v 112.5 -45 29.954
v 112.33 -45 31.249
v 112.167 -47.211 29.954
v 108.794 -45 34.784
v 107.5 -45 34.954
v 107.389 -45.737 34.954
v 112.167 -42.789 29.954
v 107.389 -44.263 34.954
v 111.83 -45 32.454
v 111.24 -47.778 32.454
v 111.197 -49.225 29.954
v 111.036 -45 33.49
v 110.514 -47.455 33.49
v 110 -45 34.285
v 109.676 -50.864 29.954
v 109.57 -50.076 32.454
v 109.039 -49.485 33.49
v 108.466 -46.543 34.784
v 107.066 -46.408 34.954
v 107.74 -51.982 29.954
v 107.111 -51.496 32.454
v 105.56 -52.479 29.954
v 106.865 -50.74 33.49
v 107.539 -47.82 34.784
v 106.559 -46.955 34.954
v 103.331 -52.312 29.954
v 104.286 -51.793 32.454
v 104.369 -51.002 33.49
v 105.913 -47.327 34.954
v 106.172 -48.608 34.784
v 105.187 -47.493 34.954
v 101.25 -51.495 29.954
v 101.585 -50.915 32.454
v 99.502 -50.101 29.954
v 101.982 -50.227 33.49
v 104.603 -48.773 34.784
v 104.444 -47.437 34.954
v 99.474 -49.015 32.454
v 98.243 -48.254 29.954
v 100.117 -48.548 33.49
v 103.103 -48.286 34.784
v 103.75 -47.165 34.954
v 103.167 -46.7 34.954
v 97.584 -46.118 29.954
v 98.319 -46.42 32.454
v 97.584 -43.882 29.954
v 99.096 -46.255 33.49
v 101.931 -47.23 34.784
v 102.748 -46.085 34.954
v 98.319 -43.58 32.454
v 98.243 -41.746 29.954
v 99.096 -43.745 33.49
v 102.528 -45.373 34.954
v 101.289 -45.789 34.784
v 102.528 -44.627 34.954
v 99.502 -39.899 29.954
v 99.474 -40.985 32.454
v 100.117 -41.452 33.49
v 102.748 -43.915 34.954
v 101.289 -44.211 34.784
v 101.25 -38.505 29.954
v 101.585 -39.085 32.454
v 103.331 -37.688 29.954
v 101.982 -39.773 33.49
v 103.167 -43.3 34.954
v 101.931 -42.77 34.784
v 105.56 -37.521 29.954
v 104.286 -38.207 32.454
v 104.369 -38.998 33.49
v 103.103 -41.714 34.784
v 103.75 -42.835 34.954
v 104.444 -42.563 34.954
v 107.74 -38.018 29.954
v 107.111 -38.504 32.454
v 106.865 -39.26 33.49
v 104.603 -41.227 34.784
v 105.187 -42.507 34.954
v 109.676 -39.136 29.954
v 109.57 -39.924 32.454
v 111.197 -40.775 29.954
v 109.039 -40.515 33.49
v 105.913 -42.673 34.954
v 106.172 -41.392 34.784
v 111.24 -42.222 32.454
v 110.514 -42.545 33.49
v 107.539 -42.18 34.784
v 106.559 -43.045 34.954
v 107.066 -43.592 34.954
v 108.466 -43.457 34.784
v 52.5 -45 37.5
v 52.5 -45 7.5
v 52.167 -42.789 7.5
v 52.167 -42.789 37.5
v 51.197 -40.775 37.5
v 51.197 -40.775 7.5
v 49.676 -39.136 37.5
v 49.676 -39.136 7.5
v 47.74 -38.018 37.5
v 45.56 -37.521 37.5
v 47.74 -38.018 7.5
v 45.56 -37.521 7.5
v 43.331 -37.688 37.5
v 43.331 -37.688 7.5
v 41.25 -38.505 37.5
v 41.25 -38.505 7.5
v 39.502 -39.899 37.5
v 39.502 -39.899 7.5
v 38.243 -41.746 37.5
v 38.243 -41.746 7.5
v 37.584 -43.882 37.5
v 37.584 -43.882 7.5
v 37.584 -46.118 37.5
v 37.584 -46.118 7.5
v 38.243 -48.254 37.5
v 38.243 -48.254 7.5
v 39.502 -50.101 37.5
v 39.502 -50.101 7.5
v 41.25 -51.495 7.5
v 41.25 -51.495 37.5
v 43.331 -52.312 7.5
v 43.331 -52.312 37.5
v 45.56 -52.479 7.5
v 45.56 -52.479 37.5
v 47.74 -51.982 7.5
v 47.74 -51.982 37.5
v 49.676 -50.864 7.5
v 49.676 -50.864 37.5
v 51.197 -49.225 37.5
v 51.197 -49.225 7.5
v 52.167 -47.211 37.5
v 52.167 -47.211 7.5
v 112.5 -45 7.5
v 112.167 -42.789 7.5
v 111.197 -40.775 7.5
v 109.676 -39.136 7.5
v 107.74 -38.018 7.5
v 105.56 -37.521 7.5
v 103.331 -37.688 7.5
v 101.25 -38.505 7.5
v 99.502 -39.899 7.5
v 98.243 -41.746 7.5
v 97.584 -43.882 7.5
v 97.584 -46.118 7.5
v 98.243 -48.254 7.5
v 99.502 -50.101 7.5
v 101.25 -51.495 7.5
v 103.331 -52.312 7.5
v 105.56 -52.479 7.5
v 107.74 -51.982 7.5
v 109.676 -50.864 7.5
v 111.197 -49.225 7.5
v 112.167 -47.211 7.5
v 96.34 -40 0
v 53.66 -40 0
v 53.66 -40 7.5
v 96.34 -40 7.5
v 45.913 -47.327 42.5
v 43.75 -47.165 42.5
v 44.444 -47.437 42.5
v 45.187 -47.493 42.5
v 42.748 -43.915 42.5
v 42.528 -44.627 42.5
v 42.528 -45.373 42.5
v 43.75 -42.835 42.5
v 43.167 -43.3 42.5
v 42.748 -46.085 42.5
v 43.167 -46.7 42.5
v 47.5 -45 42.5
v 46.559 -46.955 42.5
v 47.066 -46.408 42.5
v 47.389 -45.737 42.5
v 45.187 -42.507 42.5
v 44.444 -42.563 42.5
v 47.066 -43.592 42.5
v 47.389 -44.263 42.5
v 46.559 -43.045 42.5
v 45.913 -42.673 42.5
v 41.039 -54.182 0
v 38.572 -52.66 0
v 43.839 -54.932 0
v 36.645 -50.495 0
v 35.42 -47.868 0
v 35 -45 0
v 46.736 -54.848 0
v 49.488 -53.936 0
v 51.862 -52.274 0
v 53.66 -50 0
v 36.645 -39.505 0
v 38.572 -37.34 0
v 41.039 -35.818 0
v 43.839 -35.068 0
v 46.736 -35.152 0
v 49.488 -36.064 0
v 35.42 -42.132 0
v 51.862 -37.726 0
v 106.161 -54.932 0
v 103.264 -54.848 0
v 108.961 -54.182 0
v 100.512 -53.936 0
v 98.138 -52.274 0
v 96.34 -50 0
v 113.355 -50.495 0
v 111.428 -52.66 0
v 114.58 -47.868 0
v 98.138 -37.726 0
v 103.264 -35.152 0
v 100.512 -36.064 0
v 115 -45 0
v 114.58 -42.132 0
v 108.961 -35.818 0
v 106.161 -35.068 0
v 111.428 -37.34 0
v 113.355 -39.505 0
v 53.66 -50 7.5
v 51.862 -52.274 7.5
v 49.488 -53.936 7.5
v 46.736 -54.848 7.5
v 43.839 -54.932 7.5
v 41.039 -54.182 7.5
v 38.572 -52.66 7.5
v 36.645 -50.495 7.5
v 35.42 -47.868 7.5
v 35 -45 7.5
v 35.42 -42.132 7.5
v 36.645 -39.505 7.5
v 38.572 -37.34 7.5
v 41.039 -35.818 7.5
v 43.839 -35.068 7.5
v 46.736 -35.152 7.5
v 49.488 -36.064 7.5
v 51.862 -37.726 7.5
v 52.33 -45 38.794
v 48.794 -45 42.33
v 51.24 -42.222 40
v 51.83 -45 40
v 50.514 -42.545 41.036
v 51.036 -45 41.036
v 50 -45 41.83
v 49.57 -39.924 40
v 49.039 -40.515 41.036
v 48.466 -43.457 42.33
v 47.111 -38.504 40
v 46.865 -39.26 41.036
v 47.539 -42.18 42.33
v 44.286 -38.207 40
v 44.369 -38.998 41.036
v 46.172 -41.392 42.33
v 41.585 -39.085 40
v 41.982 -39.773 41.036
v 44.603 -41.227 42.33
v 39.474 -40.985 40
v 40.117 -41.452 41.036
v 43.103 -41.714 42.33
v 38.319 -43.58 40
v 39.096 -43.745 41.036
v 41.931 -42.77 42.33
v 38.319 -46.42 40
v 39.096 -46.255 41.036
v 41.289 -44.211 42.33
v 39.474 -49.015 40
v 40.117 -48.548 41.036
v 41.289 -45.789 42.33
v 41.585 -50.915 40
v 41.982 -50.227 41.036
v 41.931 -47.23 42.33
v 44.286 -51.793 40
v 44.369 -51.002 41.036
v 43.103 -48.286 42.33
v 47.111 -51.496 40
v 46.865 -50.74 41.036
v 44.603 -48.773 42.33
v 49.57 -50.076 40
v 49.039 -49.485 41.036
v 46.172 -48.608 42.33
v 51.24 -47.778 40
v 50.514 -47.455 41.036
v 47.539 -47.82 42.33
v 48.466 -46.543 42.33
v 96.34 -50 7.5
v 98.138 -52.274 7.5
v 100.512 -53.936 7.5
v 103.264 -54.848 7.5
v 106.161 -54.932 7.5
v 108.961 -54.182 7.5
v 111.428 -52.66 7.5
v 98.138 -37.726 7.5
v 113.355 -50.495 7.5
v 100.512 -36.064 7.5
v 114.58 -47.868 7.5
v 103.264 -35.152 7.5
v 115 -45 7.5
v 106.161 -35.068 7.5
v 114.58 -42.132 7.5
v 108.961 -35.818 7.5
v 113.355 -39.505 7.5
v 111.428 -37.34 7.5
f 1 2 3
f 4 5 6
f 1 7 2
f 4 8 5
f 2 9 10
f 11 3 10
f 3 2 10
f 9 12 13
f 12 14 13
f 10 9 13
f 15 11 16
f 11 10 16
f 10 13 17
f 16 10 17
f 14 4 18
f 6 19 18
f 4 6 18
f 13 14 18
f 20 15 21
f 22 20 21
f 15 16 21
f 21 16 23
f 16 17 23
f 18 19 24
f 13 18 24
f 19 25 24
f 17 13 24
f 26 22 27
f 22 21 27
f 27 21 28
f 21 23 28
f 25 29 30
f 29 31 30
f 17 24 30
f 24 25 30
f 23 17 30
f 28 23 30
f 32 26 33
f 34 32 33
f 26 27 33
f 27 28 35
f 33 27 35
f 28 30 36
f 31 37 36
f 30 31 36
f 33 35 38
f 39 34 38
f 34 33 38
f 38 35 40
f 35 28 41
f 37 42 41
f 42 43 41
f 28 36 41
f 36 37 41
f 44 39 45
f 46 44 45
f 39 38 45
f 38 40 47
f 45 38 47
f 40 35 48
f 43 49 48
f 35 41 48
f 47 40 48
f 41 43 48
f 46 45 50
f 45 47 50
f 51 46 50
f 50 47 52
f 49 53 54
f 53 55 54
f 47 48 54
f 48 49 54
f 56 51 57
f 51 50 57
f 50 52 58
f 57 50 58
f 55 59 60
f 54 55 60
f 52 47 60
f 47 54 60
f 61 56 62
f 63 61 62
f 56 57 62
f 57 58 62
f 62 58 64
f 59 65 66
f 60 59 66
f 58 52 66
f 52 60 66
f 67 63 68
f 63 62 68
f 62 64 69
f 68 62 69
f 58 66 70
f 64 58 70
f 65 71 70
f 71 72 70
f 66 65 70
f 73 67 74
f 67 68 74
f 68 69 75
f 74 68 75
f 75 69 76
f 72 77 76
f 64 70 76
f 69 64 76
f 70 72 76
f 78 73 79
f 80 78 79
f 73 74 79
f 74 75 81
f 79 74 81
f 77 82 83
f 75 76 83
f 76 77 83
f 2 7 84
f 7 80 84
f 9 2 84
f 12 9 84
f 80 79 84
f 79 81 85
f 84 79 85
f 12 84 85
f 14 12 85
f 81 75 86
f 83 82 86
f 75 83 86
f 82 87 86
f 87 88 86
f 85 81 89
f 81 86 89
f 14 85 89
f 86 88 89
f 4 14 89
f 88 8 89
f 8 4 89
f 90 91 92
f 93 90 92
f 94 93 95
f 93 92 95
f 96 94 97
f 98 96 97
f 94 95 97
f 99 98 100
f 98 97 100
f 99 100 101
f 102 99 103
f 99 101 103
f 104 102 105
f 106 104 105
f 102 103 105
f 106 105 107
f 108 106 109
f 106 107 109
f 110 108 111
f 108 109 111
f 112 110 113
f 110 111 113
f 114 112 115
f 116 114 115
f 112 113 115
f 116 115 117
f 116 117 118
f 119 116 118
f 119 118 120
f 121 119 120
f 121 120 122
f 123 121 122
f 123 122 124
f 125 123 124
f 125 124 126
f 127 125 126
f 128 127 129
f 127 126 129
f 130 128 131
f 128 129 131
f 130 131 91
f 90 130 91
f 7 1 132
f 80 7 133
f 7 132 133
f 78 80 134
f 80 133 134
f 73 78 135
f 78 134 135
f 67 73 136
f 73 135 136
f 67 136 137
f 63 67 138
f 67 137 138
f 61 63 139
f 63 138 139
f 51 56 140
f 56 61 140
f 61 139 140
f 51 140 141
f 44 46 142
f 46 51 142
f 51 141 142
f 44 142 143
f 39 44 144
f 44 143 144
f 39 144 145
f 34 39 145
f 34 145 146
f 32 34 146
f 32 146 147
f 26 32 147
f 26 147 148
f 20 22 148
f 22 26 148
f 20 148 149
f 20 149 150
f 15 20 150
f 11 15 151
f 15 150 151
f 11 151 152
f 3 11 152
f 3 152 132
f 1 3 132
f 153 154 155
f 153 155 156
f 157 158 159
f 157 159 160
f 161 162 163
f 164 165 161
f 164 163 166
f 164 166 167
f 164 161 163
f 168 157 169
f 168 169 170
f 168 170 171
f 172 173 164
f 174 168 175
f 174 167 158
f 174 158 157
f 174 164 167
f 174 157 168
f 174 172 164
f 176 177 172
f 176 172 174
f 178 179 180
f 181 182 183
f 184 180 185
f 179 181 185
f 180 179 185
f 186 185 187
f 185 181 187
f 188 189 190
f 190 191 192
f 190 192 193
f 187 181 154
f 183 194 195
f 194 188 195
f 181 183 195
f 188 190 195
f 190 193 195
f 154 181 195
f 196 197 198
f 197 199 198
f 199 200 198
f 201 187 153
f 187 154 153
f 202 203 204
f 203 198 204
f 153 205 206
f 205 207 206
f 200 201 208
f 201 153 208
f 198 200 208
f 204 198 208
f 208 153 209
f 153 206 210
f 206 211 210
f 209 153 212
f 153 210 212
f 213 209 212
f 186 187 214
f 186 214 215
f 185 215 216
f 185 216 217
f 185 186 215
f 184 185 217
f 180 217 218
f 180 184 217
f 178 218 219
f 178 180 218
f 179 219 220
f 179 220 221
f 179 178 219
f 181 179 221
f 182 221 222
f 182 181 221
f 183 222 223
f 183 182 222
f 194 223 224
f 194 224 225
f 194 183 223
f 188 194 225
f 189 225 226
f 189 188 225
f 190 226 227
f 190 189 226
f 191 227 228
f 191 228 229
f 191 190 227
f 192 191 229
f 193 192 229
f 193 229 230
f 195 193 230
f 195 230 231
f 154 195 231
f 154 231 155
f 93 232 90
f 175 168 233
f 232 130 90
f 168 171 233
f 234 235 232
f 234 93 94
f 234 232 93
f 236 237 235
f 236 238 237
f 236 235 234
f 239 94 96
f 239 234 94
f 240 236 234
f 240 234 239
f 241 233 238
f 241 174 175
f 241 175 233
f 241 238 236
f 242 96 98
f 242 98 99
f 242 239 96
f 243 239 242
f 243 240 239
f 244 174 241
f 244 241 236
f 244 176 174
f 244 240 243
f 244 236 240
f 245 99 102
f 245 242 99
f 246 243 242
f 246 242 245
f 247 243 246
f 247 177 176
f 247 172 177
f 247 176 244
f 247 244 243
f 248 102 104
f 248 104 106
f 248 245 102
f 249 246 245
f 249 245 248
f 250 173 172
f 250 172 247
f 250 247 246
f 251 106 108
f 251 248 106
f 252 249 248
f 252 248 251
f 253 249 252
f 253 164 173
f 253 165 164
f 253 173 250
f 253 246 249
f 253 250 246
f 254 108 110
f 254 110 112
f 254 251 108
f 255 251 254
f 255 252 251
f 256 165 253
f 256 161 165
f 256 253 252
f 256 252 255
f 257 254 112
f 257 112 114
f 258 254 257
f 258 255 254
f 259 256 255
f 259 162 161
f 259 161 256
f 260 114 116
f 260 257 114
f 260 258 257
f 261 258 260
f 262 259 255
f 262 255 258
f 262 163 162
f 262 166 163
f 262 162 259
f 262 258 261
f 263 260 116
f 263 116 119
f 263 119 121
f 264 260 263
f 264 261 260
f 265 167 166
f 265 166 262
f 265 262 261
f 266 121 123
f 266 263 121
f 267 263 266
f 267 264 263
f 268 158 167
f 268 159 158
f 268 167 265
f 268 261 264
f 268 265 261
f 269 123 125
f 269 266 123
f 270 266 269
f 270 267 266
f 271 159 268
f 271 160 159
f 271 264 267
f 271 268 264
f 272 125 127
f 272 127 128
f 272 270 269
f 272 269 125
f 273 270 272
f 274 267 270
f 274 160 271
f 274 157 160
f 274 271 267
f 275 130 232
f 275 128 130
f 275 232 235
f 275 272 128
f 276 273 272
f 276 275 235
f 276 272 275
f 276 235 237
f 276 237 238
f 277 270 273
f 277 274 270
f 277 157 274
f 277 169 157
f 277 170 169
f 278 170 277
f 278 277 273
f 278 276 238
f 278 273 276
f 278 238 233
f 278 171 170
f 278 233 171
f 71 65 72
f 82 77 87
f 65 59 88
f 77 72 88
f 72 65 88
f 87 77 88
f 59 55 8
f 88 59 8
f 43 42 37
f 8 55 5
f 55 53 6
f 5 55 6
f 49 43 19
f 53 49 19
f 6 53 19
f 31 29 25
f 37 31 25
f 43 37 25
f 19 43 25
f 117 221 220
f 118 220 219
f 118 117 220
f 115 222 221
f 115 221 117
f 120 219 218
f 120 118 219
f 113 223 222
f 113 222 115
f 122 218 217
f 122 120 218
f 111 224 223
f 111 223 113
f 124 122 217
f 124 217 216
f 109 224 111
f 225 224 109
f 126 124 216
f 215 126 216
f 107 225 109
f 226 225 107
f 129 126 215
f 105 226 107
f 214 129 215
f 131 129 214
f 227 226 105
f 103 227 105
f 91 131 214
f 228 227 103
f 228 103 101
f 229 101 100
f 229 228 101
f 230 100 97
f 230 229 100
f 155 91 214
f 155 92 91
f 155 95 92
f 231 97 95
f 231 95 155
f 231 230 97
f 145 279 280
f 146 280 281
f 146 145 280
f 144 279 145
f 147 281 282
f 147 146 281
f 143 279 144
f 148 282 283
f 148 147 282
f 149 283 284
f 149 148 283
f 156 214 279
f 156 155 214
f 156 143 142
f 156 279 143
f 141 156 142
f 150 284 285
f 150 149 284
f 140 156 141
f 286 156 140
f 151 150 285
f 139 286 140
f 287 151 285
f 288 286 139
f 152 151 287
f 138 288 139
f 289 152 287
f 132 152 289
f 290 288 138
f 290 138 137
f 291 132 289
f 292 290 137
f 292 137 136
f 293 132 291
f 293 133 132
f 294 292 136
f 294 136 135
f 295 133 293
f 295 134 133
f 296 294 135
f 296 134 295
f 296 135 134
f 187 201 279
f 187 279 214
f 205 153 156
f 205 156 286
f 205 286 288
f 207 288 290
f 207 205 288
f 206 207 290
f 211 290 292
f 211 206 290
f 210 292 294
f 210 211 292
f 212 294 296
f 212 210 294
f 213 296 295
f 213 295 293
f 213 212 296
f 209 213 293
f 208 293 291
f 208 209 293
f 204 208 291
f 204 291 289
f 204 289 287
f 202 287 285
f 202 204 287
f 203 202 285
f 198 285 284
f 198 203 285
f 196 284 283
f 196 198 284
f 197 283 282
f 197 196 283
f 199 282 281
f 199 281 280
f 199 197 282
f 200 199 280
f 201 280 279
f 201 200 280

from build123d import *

# Parameters (mm, degrees)
SKETCH1_W               = 150
SKETCH1_H               = 90
BOSS_EXTRUDE1_DEPTH     = 70
SHELL4_T                = -5
SKETCH2_R               = 20
BOSS_EXTRUDE2_DEPTH     = 2.5
SKETCH3_R               = 7.5
BOSS_EXTRUDE3_DEPTH     = 35
SKETCH4_W               = 65
SKETCH4_H               = 4.658499389
CUT_EXTRUDE1_DEPTH      = 189.414436814
SKETCH6_W               = 3
SKETCH6_H               = 3
CUT_EXTRUDE3_DEPTH      = 40
FILLET4_R               = 5
FILLET5_R               = 5
SKETCH10_W              = 3
SKETCH10_H              = 3
CUT_EXTRUDE4_DEPTH      = 40
CUT_EXTRUDE5_DEPTH      = 187.614576065
CUT_EXTRUDE5_DEPTH_BACK = 187.614576065
SKETCH11_W              = 3
SKETCH11_H              = 3
SKETCH11_R              = 20
SKETCH12_W              = 30
SKETCH12_H              = 10
BOSS_EXTRUDE4_DEPTH     = 7.5
CUT_EXTRUDE8_DEPTH      = 146.17231141
CUT_EXTRUDE8_DEPTH_BACK = 146.17231141


with BuildPart() as part:
    # Sketch1 → Boss-Extrude1 (new body)
    with BuildSketch(Plane.XY):
        with Locations((75, -45)):
            Rectangle(SKETCH1_W, SKETCH1_H)
    extrude(amount=BOSS_EXTRUDE1_DEPTH)

    # Shell4
    shell4_openings = [part.faces().sort_by_distance(p)[0] for p in [
        (75, -45, 70),
    ]]
    offset(amount=SHELL4_T, openings=shell4_openings, kind=Kind.INTERSECTION)

    # Sketch2 → Boss-Extrude2 (add)
    with BuildSketch(Plane.XY.offset(5)):
        with Locations((45, -45)):
            Circle(SKETCH2_R)
        with Locations((105, -45)):
            Circle(SKETCH2_R)
    extrude(amount=BOSS_EXTRUDE2_DEPTH)

    # Sketch3 → Boss-Extrude3 (add)
    with BuildSketch(Plane.XY.offset(7.5)):
        with Locations((45, -45)):
            Circle(SKETCH3_R)
        with Locations((105, -45)):
            Circle(SKETCH3_R)
    extrude(amount=BOSS_EXTRUDE3_DEPTH)

    # Sketch4 → Cut-Extrude1 (cut, through all)
    with BuildSketch(Plane.XZ.offset(90)):
        Polygon((85, 70), (85, 49.954434269), (85, 34.954434269), (150, 34.954434269), (150, 70), align=None)
        with Locations((117.5, 72.329249694)):
            Rectangle(SKETCH4_W, SKETCH4_H)
    extrude(amount=-CUT_EXTRUDE1_DEPTH, mode=Mode.SUBTRACT)

    # Sketch6 → Cut-Extrude3 (cut)
    with BuildSketch(Plane.XY.offset(34.954434269)):
        with Locations((96.5, -2.5)):
            Rectangle(SKETCH6_W, SKETCH6_H)
        with Locations((113.5, -2.5)):
            Rectangle(SKETCH6_W, SKETCH6_H)
        with Locations((96.5, -87.5)):
            Rectangle(SKETCH6_W, SKETCH6_H)
        with Locations((113.5, -87.5)):
            Rectangle(SKETCH6_W, SKETCH6_H)
    extrude(amount=-CUT_EXTRUDE3_DEPTH, mode=Mode.SUBTRACT)

    # Fillet4
    fillet4_edges = [part.edges().sort_by_distance(p)[0] for p in [
        (5, -5, 37.5),
        (5, -85, 37.5),
        (145, -5, 19.977217134),
        (145, -85, 19.977217134),
        (150, 0, 17.477217134),
        (150, -90, 17.477217134),
        (85, -87.5, 70),
        (85, -87.5, 34.954434269),
        (85, -2.5, 70),
        (85, -2.5, 34.954434269),
        (0, 0, 35),
        (0, -90, 35),
    ]]
    fillet(fillet4_edges, radius=FILLET4_R)

    # Fillet5
    fillet5_edges = [part.edges().sort_by_distance(p)[0] for p in [
        (37.5, -45, 42.5),
        (97.5, -45, 34.954434269),
    ]]
    fillet(fillet5_edges, radius=FILLET5_R)

    # Sketch10 → Cut-Extrude4 (cut)
    with BuildSketch(Plane.XY.offset(70)):
        with Locations((2.5, -45)):
            Rectangle(SKETCH10_W, SKETCH10_H)
        with Locations((37.5, -87.5)):
            Rectangle(SKETCH10_W, SKETCH10_H)
        with Locations((37.5, -2.5)):
            Rectangle(SKETCH10_W, SKETCH10_H)
    extrude(amount=-CUT_EXTRUDE4_DEPTH, mode=Mode.SUBTRACT)

    # Sketch11 → Cut-Extrude5 (cut, two sides: drawn at the far end of the back side and taken through both)
    # profile 1 of 4: a face of its own
    with BuildSketch(Plane.XY.offset(5).offset(-CUT_EXTRUDE5_DEPTH_BACK)):
        with BuildLine():
            Line((85, -5), (85, 0))
            Line((85, 0), (80, 0))
            Line((80, 0), (5, 0))
            ThreePointArc((5, 0), (1.464466094, -1.464466094), (0, -5))
            Line((0, -5), (0, -85))
            ThreePointArc((0, -85), (1.464466094, -88.535533906), (5, -90))
            Line((5, -90), (80, -90))
            Line((80, -90), (85, -90))
            Line((85, -90), (85, -85))
            Line((85, -85), (80, -85))
            Line((80, -85), (10, -85))
            ThreePointArc((10, -85), (6.464466094, -83.535533906), (5, -80))
            Line((5, -80), (5, -10))
            ThreePointArc((5, -10), (6.464466094, -6.464466094), (10, -5))
            Line((10, -5), (80, -5))
            Line((80, -5), (85, -5))
        make_face()
        with Locations((37.5, -87.5)):
            Rectangle(SKETCH11_W, SKETCH11_H, mode=Mode.SUBTRACT)
        with Locations((2.5, -45)):
            Rectangle(SKETCH11_W, SKETCH11_H, mode=Mode.SUBTRACT)
        with Locations((37.5, -2.5)):
            Rectangle(SKETCH11_W, SKETCH11_H, mode=Mode.SUBTRACT)
    # profile 2 of 4: a face of its own
    with BuildSketch(Plane.XY.offset(5).offset(-CUT_EXTRUDE5_DEPTH_BACK)):
        with BuildLine():
            ThreePointArc((140, -85), (143.535533906, -83.535533906), (145, -80))
            Line((145, -80), (145, -10))
            ThreePointArc((145, -10), (143.535533906, -6.464466094), (140, -5))
            Line((140, -5), (10, -5))
            ThreePointArc((10, -5), (6.464466094, -6.464466094), (5, -10))
            Line((5, -10), (5, -80))
            ThreePointArc((5, -80), (6.464466094, -83.535533906), (10, -85))
            Line((10, -85), (140, -85))
        make_face()
        with Locations((105, -45)):
            Circle(SKETCH11_R, mode=Mode.SUBTRACT)
        with Locations((45, -45)):
            Circle(SKETCH11_R, mode=Mode.SUBTRACT)
    # profile 3 of 4: a face of its own
    with BuildSketch(Plane.XY.offset(5).offset(-CUT_EXTRUDE5_DEPTH_BACK)):
        with BuildLine():
            Line((145, 0), (90, 0))
            Line((90, 0), (85, 0))
            Line((85, 0), (85, -5))
            Line((85, -5), (90, -5))
            Line((90, -5), (140, -5))
            ThreePointArc((140, -5), (143.535533906, -6.464466094), (145, -10))
            Line((145, -10), (145, -80))
            ThreePointArc((145, -80), (143.535533906, -83.535533906), (140, -85))
            Line((140, -85), (90, -85))
            Line((90, -85), (85, -85))
            Line((85, -85), (85, -90))
            Line((85, -90), (90, -90))
            Line((90, -90), (145, -90))
            ThreePointArc((145, -90), (148.535533906, -88.535533906), (150, -85))
            Line((150, -85), (150, -5))
            ThreePointArc((150, -5), (148.535533906, -1.464466094), (145, 0))
        make_face()
    # profile 4 of 4: a face of its own
    with BuildSketch(Plane.XY.offset(5).offset(-CUT_EXTRUDE5_DEPTH_BACK)):
        with Locations((2.5, -45)):
            Rectangle(SKETCH11_W, SKETCH11_H)
    extrude(amount=CUT_EXTRUDE5_DEPTH + CUT_EXTRUDE5_DEPTH_BACK, mode=Mode.SUBTRACT)


with BuildPart() as cut_extrude5_piece_1:
    # of the separate pieces the step leaves, piece 1, a body of its own (cut_extrude5_pieces_kept)
    add(part.part.solids().sort_by_distance((65, -45, 7.5))[0])



with BuildPart() as cut_extrude5_piece_2:
    # of the separate pieces the step leaves, piece 2, a body of its own (cut_extrude5_pieces_kept)
    add(part.part.solids().sort_by_distance((112.5, -45, 29.954434269))[0])


with BuildPart() as cut_extrude5_piece_1_1:
    add(cut_extrude5_piece_1.part)

    add(cut_extrude5_piece_2.part)  # Boss-Extrude4 merges Cut-Extrude5 piece 2
    # Sketch12 → Boss-Extrude4 (add)
    with BuildSketch(Plane.XY.offset(7.5)):
        with Locations((75, -45)):
            Rectangle(SKETCH12_W, SKETCH12_H)
    extrude(amount=-BOSS_EXTRUDE4_DEPTH)

    # Sketch13 → Cut-Extrude8 (cut, two sides: drawn at the far end of the back side and taken through both)
    with BuildSketch(Plane.XY.offset(7.5).offset(-CUT_EXTRUDE8_DEPTH_BACK)):
        with BuildLine():
            ThreePointArc((64.364916731, -40), (25, -45), (64.364916731, -50))
            Line((64.364916731, -50), (53.660254038, -50))
            ThreePointArc((53.660254038, -50), (35, -45), (53.660254038, -40))
            Line((53.660254038, -40), (64.364916731, -40))
        make_face()
        with BuildLine():
            Line((96.339745962, -50), (85.635083269, -50))
            ThreePointArc((85.635083269, -50), (107.52008585, -64.840593925), (125, -45))
            ThreePointArc((125, -45), (107.52008585, -25.159406075), (85.635083269, -40))
            Line((85.635083269, -40), (96.339745962, -40))
            ThreePointArc((96.339745962, -40), (107.588190451, -35.340741737), (115, -45))
            ThreePointArc((115, -45), (107.588190451, -54.659258263), (96.339745962, -50))
        make_face()
    extrude(amount=CUT_EXTRUDE8_DEPTH + CUT_EXTRUDE8_DEPTH_BACK, mode=Mode.SUBTRACT)


solid = cut_extrude5_piece_1_1.part
